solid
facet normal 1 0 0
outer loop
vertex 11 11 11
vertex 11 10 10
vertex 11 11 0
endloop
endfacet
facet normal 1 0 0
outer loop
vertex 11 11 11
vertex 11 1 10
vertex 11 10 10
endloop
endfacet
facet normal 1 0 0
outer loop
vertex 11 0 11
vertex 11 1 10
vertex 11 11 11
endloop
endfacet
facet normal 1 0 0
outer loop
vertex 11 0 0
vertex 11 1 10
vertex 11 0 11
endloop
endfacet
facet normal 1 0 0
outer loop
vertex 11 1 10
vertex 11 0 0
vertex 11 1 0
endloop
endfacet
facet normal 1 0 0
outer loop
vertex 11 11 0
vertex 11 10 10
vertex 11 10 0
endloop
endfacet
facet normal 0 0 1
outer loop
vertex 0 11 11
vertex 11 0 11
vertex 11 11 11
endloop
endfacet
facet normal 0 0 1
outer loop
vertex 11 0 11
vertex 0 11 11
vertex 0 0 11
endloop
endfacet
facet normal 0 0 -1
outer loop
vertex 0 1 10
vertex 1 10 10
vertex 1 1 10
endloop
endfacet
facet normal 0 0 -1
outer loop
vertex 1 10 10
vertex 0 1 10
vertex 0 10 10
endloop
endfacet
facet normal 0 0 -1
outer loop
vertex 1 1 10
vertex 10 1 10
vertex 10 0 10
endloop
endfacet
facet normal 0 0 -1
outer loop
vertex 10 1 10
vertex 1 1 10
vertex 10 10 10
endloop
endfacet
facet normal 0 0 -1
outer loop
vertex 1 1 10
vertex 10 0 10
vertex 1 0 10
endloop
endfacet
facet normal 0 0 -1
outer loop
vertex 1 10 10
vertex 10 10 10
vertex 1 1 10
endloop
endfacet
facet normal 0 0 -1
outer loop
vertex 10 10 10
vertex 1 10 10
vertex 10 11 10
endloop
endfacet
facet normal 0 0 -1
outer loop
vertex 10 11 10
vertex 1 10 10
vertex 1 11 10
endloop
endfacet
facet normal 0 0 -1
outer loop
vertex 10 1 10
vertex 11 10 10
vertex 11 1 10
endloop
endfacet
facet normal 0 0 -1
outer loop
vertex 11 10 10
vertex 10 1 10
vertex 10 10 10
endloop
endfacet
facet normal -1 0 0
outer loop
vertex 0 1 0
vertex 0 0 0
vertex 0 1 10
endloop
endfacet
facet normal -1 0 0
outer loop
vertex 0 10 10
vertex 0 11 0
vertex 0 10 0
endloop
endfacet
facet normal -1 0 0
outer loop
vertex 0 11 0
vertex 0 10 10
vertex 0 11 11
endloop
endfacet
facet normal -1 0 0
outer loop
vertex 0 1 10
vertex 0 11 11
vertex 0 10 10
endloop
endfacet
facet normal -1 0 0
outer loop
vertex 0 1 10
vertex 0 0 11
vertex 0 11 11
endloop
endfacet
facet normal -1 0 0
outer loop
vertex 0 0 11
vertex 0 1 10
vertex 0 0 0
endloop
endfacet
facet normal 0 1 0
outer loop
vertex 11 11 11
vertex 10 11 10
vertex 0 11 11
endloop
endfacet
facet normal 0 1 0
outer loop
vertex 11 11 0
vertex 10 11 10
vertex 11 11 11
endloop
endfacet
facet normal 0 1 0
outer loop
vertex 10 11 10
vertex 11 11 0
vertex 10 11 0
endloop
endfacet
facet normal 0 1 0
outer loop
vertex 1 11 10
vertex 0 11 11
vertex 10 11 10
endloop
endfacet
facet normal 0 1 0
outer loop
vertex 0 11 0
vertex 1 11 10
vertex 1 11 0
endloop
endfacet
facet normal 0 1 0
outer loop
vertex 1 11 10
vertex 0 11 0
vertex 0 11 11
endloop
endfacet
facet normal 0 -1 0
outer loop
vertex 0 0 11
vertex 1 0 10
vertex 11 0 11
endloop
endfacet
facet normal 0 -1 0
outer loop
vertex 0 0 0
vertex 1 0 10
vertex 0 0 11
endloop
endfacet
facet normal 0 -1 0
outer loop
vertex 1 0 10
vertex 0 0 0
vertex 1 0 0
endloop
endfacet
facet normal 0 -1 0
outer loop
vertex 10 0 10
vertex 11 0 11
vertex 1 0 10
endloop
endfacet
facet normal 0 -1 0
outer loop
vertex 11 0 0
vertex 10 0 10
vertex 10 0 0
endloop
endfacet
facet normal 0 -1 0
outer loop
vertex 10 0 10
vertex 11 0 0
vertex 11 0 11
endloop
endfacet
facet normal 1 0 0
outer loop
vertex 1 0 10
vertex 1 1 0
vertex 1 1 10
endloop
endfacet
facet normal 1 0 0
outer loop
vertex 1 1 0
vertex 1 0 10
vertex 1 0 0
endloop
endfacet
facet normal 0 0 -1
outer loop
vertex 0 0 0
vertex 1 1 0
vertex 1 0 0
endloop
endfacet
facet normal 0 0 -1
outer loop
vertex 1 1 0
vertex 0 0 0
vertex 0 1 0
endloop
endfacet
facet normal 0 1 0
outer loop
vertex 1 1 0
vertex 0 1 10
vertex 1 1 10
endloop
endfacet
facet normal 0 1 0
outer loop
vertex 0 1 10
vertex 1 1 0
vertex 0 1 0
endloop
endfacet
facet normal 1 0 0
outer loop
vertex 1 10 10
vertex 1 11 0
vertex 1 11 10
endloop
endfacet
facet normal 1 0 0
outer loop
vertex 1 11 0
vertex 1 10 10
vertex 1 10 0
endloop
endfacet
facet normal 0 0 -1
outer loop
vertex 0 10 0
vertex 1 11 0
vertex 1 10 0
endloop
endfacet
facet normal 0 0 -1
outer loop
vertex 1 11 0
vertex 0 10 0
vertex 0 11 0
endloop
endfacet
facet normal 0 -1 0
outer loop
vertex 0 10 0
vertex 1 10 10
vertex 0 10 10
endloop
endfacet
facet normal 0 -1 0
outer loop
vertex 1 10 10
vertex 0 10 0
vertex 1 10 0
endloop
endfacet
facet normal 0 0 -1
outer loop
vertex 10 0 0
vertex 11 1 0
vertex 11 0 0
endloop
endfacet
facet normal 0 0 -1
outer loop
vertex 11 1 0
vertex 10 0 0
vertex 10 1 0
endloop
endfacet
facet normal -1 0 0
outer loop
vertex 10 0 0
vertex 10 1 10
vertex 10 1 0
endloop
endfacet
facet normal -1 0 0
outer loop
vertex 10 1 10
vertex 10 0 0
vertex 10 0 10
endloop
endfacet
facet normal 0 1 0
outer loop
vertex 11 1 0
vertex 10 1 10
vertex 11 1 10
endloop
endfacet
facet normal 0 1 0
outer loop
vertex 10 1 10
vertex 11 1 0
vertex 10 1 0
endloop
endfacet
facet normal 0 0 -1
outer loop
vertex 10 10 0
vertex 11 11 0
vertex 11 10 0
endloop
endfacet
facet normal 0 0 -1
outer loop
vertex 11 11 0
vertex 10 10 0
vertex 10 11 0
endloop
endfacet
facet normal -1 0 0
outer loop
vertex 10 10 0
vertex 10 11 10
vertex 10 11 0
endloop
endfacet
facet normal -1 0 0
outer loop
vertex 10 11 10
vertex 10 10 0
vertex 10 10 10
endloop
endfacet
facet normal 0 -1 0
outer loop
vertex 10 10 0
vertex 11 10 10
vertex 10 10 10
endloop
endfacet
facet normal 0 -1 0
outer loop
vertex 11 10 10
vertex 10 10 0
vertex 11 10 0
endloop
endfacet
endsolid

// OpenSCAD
union() {
    translate(v=[0, 0, 10])
    cube(size=[11, 11, 1]);
    translate(v=[0, 0, 0])
    cube(size=[1, 1, 10]);
    translate(v=[0, 10, 0])
    cube(size=[1, 1, 10]);
    translate(v=[10, 0, 0])
    cube(size=[1, 1, 10]);
    translate(v=[10, 10, 0])
    cube(size=[1, 1, 10]);
}
